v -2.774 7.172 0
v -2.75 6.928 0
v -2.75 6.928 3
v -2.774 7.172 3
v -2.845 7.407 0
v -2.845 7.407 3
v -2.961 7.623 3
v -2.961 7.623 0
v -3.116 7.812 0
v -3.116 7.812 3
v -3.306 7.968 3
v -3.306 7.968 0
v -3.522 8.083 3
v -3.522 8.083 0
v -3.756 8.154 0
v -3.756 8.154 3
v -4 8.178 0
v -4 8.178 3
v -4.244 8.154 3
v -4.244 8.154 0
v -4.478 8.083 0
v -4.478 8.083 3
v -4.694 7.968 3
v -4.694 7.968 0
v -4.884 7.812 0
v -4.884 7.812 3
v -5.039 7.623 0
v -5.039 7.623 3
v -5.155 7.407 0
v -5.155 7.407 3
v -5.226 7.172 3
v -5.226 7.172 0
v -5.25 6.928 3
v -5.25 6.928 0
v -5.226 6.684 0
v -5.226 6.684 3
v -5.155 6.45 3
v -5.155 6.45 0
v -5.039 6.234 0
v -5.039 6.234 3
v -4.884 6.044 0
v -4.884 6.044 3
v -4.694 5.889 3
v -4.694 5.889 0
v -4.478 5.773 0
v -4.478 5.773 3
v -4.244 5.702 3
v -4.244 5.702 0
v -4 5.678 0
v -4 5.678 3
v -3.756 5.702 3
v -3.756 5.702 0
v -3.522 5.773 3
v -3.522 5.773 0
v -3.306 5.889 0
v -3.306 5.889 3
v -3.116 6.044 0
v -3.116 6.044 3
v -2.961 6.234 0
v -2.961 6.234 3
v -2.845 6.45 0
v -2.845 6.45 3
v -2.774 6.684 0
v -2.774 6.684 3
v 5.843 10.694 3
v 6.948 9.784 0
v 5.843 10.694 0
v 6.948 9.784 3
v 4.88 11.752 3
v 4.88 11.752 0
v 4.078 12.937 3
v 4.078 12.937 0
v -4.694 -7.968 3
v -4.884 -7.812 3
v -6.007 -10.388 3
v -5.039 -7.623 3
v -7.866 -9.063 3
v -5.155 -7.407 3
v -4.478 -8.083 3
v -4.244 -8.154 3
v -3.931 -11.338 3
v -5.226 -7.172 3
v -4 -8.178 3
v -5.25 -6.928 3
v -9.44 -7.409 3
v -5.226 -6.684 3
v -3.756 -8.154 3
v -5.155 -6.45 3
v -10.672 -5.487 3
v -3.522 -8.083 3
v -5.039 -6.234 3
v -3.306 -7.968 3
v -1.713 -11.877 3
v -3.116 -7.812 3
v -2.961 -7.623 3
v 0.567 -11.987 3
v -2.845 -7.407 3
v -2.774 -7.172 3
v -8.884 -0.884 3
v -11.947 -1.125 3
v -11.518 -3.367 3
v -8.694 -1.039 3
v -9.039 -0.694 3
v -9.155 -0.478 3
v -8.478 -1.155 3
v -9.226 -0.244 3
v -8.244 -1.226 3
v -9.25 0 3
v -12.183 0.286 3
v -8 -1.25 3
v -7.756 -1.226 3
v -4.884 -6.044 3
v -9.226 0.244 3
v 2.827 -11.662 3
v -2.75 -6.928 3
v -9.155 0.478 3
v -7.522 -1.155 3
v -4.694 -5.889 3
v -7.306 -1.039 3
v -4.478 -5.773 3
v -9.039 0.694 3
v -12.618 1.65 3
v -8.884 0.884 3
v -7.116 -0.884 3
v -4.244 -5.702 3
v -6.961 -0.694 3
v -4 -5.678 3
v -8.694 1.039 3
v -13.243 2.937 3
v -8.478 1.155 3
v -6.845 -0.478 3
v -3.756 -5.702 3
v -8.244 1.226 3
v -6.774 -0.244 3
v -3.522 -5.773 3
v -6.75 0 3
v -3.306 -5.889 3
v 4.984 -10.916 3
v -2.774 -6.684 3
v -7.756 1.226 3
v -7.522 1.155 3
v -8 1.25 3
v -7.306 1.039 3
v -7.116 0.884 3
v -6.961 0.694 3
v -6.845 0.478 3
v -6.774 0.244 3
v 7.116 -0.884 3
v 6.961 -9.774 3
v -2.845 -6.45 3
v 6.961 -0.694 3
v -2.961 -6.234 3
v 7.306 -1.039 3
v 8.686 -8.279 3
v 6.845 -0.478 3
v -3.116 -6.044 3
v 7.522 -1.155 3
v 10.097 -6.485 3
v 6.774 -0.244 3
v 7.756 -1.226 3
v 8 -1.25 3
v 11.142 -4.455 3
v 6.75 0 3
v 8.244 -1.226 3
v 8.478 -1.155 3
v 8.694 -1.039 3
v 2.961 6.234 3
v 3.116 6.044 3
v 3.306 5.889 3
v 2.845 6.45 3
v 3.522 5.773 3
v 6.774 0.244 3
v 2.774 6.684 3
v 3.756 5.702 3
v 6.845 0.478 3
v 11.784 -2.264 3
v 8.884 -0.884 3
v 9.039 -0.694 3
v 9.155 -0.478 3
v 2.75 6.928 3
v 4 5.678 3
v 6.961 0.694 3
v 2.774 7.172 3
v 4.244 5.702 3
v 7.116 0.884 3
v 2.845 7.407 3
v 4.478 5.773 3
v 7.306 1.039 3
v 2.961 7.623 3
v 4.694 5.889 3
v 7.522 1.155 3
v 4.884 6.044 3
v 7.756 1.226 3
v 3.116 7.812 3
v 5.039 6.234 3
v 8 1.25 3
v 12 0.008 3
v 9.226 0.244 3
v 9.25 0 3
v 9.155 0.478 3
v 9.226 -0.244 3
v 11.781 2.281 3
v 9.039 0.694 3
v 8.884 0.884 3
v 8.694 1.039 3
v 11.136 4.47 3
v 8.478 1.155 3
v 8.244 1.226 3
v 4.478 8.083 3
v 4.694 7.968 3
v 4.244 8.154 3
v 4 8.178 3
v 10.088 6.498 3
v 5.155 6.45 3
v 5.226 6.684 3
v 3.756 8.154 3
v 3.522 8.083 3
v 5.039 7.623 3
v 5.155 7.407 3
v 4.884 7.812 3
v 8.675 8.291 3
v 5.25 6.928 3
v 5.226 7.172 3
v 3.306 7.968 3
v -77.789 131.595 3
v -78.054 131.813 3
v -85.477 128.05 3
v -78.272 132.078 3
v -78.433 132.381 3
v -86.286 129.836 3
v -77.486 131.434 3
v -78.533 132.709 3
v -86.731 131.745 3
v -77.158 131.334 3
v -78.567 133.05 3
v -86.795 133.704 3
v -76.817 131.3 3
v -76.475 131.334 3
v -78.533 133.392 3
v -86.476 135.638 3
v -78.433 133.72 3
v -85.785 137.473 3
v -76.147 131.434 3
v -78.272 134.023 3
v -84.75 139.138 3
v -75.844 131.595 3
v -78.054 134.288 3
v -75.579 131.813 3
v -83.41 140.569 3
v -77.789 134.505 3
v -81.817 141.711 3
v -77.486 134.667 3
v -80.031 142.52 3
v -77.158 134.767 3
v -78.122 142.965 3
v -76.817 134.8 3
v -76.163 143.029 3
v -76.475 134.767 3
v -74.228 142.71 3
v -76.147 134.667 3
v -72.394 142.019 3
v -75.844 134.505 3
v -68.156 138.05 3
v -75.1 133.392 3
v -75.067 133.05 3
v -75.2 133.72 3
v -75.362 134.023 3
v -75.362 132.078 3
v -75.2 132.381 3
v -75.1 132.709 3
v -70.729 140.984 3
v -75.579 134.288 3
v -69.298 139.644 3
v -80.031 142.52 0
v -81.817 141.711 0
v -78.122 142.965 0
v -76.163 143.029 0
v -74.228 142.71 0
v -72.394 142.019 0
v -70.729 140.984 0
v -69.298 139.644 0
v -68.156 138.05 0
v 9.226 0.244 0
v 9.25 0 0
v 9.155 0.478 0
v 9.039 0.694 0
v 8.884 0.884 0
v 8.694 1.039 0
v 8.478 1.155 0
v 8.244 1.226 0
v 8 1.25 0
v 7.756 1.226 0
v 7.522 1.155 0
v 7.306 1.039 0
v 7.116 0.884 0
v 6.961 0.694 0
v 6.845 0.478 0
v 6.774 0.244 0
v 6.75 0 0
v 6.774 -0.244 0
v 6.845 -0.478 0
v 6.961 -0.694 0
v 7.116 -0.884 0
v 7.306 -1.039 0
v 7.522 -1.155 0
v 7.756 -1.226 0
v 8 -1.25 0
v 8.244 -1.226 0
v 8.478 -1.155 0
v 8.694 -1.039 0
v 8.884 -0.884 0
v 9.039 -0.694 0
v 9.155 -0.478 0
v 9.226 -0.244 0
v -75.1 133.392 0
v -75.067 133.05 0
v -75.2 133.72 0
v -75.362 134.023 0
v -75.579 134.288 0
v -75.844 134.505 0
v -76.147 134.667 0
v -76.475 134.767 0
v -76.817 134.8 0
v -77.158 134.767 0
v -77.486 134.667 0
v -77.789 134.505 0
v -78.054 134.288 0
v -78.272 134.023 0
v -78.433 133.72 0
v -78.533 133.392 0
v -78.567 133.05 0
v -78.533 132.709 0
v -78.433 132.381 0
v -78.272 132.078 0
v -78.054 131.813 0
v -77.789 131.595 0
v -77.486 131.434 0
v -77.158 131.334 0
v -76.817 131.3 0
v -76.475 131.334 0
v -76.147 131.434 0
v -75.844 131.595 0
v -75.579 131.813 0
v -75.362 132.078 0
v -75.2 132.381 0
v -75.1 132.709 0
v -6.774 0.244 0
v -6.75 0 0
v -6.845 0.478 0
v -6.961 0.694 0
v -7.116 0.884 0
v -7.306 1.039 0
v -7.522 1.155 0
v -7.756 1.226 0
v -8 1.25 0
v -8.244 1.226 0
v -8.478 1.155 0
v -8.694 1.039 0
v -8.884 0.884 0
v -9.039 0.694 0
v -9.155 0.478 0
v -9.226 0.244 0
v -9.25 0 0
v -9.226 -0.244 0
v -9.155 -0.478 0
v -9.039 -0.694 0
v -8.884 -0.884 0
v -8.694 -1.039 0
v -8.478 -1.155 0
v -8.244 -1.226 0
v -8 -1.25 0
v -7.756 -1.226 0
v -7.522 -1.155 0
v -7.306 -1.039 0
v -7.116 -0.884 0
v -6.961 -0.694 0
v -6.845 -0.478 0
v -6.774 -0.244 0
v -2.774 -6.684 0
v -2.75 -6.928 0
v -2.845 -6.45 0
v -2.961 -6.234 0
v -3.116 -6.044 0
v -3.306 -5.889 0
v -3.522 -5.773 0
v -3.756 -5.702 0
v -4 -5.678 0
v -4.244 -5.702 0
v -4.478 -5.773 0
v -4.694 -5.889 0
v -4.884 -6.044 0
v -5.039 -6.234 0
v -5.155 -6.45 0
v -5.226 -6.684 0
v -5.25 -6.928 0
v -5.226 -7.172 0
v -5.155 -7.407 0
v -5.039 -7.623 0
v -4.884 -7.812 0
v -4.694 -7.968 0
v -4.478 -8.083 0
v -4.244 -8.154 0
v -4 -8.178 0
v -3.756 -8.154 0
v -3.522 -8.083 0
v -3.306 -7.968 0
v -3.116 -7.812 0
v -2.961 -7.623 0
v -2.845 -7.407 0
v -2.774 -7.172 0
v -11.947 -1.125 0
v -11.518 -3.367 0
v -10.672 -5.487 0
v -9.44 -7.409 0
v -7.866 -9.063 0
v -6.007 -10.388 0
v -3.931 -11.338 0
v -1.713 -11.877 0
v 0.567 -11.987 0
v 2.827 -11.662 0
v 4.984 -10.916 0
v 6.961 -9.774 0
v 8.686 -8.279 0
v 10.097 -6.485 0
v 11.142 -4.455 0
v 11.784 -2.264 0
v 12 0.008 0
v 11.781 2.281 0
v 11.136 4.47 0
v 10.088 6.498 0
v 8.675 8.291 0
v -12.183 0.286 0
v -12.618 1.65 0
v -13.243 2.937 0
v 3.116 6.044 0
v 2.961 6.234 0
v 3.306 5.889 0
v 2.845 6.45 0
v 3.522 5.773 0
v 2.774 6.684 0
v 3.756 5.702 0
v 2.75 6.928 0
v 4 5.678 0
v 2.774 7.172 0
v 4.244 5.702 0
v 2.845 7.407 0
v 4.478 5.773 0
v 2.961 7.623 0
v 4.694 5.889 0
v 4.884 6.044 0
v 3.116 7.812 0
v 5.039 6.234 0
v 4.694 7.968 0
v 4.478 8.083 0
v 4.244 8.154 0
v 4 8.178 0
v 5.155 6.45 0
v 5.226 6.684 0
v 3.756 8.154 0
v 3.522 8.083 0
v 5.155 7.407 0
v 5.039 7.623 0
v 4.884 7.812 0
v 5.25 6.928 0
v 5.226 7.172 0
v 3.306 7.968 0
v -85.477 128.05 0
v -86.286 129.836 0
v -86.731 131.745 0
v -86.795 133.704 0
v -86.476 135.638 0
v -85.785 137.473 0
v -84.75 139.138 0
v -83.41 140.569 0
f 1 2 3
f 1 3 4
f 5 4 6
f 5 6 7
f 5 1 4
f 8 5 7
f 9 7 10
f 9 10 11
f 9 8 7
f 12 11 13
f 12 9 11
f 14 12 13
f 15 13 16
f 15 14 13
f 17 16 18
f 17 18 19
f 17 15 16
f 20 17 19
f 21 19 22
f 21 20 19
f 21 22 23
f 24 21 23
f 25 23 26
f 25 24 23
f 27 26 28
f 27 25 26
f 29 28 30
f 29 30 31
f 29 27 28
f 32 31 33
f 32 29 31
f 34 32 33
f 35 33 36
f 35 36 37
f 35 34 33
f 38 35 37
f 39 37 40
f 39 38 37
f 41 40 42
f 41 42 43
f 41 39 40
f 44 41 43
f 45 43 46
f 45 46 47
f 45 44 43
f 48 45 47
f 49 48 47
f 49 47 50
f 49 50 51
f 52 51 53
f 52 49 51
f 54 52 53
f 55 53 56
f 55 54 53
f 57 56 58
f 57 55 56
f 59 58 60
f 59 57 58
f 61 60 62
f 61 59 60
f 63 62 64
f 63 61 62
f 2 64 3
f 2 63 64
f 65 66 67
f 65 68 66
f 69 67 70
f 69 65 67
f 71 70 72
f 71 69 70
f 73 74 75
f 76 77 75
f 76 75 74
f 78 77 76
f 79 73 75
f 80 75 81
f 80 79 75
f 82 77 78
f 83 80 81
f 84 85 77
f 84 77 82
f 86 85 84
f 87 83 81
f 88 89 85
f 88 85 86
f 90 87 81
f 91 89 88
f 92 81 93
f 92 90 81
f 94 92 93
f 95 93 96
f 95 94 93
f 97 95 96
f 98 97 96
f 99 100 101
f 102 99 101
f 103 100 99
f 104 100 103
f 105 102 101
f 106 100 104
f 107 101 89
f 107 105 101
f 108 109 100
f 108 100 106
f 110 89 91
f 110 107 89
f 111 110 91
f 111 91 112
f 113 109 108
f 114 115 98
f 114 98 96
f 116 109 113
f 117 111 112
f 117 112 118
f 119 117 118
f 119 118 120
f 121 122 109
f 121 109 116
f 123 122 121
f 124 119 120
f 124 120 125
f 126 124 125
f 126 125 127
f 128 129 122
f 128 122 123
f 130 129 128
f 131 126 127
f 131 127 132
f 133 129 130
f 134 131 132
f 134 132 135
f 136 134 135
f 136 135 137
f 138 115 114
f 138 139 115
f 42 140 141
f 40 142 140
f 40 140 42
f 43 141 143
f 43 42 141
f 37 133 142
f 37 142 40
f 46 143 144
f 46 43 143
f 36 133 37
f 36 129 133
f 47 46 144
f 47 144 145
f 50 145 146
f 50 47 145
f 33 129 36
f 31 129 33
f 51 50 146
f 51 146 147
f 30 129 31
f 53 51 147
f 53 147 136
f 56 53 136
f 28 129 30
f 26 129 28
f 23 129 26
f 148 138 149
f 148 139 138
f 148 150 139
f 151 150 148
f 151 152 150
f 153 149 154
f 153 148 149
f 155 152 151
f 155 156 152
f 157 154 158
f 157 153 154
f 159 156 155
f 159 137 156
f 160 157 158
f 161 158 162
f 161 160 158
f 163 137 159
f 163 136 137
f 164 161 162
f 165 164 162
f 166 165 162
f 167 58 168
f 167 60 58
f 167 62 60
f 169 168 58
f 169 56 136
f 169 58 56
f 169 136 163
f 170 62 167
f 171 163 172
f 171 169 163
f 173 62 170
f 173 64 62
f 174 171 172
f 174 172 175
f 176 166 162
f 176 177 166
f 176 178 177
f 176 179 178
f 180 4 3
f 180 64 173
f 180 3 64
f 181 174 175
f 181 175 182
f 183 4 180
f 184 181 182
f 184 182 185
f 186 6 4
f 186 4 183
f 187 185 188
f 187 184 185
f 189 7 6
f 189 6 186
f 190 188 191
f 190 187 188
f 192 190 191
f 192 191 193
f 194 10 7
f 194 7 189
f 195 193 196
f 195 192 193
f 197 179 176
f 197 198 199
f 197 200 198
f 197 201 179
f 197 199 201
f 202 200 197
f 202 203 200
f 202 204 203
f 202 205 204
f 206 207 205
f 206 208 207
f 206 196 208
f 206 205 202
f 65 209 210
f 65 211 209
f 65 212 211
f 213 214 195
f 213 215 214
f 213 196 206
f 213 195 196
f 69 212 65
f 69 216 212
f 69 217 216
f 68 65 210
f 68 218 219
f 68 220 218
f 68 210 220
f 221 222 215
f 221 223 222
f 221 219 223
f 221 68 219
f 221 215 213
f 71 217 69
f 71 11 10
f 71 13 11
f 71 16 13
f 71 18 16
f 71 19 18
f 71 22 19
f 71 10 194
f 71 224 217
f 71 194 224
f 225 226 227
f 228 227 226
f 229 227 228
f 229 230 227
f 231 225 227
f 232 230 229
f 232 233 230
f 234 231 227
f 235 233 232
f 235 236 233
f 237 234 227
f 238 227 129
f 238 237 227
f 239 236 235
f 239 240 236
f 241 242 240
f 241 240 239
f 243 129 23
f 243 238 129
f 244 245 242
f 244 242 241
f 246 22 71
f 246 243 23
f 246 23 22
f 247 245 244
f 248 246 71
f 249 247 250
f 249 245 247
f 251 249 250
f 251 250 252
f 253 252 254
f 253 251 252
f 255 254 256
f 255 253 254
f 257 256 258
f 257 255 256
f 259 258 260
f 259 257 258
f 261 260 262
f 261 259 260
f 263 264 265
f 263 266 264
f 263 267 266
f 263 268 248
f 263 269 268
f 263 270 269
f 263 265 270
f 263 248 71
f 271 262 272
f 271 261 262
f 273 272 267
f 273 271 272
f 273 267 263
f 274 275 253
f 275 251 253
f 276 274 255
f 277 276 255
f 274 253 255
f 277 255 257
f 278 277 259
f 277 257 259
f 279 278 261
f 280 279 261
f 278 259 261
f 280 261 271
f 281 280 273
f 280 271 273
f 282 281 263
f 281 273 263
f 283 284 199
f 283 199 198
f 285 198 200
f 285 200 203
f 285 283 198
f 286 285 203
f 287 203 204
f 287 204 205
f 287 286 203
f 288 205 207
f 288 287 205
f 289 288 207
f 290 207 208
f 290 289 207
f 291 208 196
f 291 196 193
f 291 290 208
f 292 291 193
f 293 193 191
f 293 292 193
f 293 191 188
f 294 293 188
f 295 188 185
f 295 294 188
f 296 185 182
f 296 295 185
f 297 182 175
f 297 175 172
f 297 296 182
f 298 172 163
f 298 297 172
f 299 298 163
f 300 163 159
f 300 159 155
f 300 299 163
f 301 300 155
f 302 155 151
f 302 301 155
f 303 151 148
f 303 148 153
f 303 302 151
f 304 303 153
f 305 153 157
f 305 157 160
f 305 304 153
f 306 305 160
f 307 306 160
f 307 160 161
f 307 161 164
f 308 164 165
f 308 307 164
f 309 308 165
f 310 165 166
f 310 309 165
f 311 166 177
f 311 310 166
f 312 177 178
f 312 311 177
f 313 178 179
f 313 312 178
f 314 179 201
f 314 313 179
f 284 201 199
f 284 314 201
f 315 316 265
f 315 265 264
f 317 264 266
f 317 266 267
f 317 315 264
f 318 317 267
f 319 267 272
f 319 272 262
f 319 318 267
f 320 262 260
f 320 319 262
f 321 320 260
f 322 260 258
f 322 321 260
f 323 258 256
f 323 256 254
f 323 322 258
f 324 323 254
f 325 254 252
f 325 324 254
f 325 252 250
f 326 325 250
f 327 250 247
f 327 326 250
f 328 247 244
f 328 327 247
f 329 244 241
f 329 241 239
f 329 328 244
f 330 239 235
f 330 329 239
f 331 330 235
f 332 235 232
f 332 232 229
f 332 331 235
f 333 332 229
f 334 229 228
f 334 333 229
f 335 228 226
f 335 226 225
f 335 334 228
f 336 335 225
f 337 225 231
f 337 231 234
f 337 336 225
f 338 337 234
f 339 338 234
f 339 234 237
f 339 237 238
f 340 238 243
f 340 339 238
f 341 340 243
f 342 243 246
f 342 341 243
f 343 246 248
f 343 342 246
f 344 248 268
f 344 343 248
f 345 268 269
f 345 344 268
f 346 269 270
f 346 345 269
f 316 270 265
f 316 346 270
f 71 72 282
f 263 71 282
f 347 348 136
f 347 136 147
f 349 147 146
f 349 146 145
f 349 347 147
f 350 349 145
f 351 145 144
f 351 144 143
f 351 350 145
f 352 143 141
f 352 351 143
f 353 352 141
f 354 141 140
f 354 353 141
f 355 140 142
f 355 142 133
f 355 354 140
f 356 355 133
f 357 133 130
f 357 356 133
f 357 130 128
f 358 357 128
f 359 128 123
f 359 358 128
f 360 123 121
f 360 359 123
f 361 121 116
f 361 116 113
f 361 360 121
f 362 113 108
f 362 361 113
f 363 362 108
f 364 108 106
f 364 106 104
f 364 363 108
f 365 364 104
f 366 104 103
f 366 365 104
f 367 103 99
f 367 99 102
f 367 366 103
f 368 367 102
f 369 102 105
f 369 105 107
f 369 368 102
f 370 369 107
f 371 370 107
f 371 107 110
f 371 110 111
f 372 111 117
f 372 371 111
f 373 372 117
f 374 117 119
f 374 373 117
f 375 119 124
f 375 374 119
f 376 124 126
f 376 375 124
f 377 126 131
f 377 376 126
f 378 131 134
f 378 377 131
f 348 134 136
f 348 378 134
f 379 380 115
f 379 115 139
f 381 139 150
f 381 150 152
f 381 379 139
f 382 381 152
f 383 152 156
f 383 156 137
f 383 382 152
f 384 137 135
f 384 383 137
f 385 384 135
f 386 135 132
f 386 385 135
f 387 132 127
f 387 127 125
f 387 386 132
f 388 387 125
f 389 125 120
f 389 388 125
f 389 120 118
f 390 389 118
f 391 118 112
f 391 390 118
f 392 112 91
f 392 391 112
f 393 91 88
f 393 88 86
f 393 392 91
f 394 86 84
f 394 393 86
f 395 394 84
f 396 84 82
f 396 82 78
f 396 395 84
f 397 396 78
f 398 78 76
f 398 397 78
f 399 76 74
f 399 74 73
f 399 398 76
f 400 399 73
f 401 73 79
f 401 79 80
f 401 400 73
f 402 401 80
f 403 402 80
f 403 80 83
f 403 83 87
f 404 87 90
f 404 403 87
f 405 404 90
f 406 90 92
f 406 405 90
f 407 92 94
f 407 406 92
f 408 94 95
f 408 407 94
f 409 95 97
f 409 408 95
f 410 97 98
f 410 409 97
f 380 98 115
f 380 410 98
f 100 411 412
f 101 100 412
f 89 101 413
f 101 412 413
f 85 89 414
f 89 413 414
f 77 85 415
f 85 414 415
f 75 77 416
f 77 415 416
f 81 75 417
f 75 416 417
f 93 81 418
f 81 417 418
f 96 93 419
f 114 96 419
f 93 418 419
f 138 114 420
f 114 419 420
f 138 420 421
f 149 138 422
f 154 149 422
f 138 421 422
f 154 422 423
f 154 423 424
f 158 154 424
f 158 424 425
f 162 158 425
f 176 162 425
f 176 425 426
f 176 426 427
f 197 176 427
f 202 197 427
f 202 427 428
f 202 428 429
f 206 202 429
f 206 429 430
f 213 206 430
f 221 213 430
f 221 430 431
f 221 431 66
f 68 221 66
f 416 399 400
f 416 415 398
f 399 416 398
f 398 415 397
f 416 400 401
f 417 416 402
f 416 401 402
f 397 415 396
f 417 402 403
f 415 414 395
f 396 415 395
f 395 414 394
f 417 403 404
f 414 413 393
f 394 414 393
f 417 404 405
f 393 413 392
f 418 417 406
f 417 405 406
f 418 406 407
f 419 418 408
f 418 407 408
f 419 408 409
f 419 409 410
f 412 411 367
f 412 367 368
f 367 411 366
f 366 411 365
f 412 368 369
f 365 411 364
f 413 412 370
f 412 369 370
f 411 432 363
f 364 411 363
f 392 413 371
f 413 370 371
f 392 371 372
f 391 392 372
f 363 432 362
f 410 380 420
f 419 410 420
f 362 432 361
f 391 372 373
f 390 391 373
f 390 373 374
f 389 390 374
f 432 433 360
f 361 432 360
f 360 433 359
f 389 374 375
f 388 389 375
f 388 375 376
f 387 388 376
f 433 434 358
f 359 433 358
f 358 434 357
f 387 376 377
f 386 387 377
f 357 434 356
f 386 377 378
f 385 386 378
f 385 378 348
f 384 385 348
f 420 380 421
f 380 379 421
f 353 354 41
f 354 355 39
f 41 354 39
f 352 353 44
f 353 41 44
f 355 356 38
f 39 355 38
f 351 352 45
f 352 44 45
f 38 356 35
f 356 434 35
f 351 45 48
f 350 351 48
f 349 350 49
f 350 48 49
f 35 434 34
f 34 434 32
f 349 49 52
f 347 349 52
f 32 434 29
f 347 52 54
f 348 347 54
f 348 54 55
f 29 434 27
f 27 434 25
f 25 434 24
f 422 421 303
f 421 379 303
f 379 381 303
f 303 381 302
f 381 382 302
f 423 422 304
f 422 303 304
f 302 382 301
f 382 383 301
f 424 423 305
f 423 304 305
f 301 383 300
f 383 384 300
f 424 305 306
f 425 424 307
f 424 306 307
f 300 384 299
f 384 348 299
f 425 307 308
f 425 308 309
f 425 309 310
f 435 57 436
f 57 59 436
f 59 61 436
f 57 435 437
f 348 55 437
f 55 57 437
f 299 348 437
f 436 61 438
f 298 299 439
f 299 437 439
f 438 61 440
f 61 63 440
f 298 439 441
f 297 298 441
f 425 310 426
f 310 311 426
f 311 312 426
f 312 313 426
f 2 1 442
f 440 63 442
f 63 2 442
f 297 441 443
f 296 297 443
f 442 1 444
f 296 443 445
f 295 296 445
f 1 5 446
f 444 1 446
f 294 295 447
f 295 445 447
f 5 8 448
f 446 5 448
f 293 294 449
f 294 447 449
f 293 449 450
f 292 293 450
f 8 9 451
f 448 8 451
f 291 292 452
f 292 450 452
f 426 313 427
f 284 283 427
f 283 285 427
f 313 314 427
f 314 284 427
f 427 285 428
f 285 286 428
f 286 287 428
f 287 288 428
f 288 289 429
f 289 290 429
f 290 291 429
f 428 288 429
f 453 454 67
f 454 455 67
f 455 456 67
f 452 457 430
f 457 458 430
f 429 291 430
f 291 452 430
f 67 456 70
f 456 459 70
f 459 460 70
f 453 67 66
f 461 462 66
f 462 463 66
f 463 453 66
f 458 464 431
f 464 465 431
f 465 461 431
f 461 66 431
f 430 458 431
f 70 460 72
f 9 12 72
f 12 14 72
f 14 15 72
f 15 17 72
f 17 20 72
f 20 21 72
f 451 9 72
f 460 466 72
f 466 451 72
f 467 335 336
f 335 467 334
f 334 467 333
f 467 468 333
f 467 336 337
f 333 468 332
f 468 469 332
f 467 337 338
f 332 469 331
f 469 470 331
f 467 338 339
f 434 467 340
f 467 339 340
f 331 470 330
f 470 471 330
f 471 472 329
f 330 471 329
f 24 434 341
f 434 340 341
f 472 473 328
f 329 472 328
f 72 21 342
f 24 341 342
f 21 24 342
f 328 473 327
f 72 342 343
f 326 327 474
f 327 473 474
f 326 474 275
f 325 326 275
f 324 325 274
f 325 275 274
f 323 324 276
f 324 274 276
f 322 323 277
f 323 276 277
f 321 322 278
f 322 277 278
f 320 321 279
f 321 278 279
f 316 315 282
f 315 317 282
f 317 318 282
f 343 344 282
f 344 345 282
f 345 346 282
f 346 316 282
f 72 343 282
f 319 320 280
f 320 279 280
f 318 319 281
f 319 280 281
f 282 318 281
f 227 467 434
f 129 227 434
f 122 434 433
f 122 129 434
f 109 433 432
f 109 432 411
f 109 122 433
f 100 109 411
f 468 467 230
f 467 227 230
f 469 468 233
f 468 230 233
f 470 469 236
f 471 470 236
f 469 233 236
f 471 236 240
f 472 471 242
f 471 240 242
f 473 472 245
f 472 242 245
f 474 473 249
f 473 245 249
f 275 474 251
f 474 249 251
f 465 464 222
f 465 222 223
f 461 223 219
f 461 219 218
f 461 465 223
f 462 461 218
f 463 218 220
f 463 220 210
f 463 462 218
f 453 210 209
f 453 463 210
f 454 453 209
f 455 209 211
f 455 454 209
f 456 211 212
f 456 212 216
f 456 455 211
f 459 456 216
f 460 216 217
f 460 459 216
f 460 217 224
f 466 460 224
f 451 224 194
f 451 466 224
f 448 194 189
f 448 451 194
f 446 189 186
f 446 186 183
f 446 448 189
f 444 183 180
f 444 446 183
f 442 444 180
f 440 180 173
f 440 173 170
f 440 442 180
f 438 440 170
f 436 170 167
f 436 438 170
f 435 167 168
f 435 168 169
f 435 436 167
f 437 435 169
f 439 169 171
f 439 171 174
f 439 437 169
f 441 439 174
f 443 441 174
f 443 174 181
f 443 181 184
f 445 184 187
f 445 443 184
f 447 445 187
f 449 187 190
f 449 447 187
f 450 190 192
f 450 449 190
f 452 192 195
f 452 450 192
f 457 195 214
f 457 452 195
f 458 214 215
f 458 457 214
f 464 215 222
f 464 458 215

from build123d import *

# Parameters (mm, degrees)
SKETCH1_R           = 1.75
SKETCH1_R_2         = 1.25
BOSS_EXTRUDE1_DEPTH = 3
FILLET1_R           = 10


with BuildPart() as part:
    # Sketch1 → Boss-Extrude1 (new body)
    with BuildSketch(Plane.XY):
        with BuildLine():
            Line((-90.476878828, 136.710551041), (-11.976878828, 0.744562647))
            ThreePointArc((-11.976878828, 0.744562647), (6, -10.392304845), (5.343629247, 10.744562647))
            Line((5.343629247, 10.744562647), (-73.156370753, 146.710551041))
            Line((-73.156370753, 146.710551041), (-90.476878828, 136.710551041))
        make_face()
        with Locations((-76.81662479, 133.050297003)):
            Circle(SKETCH1_R, mode=Mode.SUBTRACT)
        with Locations((8, 0)):
            Circle(SKETCH1_R_2, mode=Mode.SUBTRACT)
        with Locations((-4, -6.92820323)):
            Circle(SKETCH1_R_2, mode=Mode.SUBTRACT)
        with Locations((-8, 0)):
            Circle(SKETCH1_R_2, mode=Mode.SUBTRACT)
        with Locations((-4, 6.92820323)):
            Circle(SKETCH1_R_2, mode=Mode.SUBTRACT)
        with Locations((4, 6.92820323)):
            Circle(SKETCH1_R_2, mode=Mode.SUBTRACT)
    extrude(amount=BOSS_EXTRUDE1_DEPTH)

    # Fillet1
    fillet1_edges = [part.edges().sort_by_distance(p)[0] for p in [
        (-11.976878828, 0.744562647, 1.5),
        (5.343629247, 10.744562647, 1.5),
        (-90.476878828, 136.710551041, 1.5),
        (-73.156370753, 146.710551041, 1.5),
    ]]
    fillet(fillet1_edges, radius=FILLET1_R - 0.0001)  # a hair under: the kernel refuses the full size


solid = part.part
